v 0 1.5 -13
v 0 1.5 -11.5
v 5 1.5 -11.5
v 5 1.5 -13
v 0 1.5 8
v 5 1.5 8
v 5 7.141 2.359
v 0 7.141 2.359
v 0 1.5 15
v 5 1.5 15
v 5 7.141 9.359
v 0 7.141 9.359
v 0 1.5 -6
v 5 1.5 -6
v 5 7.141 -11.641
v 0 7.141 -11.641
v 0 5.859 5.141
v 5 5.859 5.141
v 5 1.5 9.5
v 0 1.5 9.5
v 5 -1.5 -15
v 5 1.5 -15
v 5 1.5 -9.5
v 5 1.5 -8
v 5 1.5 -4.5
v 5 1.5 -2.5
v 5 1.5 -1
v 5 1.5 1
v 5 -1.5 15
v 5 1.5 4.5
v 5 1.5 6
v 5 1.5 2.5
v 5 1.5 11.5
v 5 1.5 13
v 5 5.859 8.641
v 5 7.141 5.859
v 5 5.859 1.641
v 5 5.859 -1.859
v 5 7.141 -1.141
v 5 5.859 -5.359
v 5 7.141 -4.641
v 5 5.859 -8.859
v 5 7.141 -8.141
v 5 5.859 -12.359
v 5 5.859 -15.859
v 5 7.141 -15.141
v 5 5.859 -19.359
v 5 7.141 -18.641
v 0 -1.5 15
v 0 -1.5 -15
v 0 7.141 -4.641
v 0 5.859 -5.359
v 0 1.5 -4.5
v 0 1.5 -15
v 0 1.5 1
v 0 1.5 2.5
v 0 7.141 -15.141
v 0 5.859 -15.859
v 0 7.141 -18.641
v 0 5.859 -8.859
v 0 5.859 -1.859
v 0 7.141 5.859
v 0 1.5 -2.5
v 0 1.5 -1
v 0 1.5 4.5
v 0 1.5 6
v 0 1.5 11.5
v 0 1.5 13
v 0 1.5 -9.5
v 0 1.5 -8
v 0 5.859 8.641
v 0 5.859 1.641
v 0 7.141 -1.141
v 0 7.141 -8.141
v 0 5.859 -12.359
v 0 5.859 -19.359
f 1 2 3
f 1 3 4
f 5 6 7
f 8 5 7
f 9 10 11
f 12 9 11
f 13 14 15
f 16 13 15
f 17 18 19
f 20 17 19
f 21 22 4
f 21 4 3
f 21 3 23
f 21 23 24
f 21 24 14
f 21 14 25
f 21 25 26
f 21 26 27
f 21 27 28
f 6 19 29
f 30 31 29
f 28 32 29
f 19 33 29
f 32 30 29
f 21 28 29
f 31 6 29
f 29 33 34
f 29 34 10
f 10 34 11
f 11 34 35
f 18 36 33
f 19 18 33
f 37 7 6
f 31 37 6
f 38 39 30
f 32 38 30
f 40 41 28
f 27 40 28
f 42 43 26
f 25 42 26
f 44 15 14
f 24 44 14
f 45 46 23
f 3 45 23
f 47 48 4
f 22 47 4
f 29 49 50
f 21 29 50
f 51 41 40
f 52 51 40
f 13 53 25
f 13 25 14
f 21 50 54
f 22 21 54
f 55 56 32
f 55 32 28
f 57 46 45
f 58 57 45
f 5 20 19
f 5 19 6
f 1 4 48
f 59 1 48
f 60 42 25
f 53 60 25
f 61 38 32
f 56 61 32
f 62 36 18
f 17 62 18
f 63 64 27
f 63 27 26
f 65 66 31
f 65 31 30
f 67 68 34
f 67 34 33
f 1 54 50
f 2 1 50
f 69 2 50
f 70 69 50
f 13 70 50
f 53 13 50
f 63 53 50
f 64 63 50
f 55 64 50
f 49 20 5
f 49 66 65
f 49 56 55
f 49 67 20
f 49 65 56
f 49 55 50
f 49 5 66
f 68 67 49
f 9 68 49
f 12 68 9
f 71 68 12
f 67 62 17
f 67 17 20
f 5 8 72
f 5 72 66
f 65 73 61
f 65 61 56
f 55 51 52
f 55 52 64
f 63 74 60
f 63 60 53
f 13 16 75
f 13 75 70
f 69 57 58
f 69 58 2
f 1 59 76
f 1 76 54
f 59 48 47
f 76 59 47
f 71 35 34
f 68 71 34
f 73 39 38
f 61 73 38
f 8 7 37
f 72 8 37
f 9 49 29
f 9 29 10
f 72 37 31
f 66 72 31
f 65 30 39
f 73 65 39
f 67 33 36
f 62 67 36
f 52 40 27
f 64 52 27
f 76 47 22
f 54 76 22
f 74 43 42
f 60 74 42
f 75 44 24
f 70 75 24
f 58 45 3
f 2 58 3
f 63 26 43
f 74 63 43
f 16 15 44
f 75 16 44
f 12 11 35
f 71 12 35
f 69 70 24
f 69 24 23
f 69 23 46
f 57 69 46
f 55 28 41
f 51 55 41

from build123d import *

# Parameters (mm, degrees)
SKETCH1_W           = 30
SKETCH1_H           = 3
BOSS_EXTRUDE1_DEPTH = 5
BOSS_EXTRUDE3_DEPTH = 5
LPATTERN2_COUNT     = 9
LPATTERN2_PITCH     = 3.5


with BuildPart() as part:
    # Sketch1 → Boss-Extrude1 (new body)
    with BuildSketch(Plane(origin=(0, 0, 0), x_dir=(0, 0, -1), z_dir=(1, 0, 0))):
        Rectangle(SKETCH1_W, SKETCH1_H)
    extrude(amount=BOSS_EXTRUDE1_DEPTH)

    # Sketch2 → Boss-Extrude3 (add)
    with BuildSketch(Plane(origin=(5, 0, 0), x_dir=(0, 0, -1), z_dir=(1, 0, 0))):
        Polygon((15, 1.5), (13, 1.5), (18.641236999, 7.141236999), (19.358763001, 5.858763001), align=None)
    boss_extrude3 = extrude(amount=-BOSS_EXTRUDE3_DEPTH)

    # LPattern2: Boss-Extrude3 ×9
    with Locations(*[(0, 0, i * LPATTERN2_PITCH) for i in range(1, LPATTERN2_COUNT)]):
        add(boss_extrude3)


solid = part.part
